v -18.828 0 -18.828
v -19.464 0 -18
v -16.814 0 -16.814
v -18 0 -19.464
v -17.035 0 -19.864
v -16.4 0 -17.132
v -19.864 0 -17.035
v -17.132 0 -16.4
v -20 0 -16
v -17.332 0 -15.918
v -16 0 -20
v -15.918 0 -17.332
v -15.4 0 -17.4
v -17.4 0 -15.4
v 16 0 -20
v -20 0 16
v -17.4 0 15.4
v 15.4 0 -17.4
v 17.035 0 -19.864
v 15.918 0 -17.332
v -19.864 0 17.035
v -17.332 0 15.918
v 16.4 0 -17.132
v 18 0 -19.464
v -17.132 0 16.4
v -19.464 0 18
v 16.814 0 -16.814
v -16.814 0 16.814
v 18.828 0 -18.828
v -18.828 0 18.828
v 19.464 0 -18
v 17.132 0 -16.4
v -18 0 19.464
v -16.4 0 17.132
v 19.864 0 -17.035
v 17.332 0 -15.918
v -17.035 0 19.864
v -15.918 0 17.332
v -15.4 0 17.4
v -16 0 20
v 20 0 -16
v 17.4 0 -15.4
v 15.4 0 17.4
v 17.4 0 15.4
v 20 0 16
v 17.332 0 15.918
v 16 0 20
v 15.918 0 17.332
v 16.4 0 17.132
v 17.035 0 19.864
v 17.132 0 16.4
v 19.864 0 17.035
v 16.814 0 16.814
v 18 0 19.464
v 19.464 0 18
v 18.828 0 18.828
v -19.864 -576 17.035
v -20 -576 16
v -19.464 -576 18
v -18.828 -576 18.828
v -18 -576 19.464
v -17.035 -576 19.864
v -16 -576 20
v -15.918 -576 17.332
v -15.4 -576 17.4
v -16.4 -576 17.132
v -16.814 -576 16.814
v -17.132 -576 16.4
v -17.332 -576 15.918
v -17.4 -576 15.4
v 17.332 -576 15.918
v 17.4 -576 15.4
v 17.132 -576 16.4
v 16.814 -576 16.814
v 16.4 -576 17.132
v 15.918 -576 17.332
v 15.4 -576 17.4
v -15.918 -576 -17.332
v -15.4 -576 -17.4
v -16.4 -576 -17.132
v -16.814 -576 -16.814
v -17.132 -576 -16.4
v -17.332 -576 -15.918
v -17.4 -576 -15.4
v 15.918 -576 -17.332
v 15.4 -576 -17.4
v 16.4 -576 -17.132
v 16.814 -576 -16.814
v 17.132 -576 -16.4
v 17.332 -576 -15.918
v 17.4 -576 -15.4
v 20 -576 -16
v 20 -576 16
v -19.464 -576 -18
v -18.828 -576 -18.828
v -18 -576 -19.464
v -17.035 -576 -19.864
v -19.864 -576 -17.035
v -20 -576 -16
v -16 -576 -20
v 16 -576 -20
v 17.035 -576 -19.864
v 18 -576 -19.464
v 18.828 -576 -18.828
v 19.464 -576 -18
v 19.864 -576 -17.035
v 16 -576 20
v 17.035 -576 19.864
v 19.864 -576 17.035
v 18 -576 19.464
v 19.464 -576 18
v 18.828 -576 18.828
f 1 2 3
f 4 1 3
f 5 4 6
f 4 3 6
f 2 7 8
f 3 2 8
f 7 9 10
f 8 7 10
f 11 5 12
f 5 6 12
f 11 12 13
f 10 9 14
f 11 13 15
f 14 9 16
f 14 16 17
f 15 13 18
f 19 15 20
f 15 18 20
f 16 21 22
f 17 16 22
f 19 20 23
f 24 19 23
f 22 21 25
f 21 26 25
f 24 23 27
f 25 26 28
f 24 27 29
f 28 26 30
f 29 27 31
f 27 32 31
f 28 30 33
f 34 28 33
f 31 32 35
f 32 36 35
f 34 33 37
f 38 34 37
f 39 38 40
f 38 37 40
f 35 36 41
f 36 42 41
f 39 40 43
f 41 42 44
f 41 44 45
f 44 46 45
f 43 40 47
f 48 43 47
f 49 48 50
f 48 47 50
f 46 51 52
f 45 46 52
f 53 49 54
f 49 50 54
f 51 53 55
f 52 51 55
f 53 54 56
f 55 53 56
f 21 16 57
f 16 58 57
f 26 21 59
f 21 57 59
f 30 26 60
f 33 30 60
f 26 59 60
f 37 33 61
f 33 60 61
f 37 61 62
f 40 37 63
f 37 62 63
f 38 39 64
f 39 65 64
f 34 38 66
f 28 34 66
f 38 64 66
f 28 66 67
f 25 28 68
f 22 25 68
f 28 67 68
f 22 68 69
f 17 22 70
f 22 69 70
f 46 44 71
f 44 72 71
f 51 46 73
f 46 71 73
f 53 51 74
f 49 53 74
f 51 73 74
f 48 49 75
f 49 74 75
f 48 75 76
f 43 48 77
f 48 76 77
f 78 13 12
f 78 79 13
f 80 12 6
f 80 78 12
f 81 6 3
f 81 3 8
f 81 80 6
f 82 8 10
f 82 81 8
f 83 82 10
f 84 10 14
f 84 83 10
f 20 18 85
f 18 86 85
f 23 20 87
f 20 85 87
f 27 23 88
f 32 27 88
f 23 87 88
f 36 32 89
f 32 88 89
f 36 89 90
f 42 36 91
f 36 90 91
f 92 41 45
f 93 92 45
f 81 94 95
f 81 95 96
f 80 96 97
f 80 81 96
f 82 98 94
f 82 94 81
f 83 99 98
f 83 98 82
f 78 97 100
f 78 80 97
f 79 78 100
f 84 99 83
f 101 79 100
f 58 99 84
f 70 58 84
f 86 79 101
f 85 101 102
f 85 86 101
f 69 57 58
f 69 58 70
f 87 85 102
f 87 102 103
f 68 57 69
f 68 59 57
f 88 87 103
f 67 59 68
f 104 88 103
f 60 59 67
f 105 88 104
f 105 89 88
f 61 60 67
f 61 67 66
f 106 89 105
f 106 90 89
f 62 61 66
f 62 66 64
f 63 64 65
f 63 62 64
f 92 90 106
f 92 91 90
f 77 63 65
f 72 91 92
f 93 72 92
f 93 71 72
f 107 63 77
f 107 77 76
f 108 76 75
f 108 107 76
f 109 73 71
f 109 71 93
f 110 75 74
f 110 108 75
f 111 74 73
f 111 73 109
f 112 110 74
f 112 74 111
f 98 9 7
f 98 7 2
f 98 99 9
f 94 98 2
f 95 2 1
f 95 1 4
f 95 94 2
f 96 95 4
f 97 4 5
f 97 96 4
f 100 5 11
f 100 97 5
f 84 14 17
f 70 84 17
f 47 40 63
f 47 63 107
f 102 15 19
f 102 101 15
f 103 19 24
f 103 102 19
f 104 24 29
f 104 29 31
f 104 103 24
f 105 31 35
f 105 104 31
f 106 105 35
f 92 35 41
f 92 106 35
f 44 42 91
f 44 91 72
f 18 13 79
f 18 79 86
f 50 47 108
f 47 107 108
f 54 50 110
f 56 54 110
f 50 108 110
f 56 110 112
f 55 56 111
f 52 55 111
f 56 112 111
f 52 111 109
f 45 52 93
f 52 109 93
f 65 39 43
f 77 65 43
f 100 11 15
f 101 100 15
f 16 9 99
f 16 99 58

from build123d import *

# Parameters (mm, degrees)
F0_W     = 40
F0_H     = 40
F0_W_2   = 34.8
F0_H_2   = 34.8
F1_DEPTH = 576
F2_R     = 4
F3_R     = 2


with BuildPart() as f1:
    # F0 (on Front) → F1 (new body)
    with BuildSketch(Plane.XZ):
        Rectangle(F0_W, F0_H)
        Rectangle(F0_W_2, F0_H_2, mode=Mode.SUBTRACT)
    extrude(amount=F1_DEPTH)

    # F2
    f2_edges = [f1.edges().sort_by_distance(p)[0] for p in [
        (20, -288, 20),
        (-20, -288, 20),
        (20, -288, -20),
        (-20, -288, -20),
    ]]
    fillet(f2_edges, radius=F2_R)

    # F3
    f3_edges = [f1.edges().sort_by_distance(p)[0] for p in [
        (-17.4, -288, 17.4),
        (-17.4, -288, -17.4),
        (17.4, -288, -17.4),
        (17.4, -288, 17.4),
    ]]
    fillet(f3_edges, radius=F3_R)


solid = f1.part
